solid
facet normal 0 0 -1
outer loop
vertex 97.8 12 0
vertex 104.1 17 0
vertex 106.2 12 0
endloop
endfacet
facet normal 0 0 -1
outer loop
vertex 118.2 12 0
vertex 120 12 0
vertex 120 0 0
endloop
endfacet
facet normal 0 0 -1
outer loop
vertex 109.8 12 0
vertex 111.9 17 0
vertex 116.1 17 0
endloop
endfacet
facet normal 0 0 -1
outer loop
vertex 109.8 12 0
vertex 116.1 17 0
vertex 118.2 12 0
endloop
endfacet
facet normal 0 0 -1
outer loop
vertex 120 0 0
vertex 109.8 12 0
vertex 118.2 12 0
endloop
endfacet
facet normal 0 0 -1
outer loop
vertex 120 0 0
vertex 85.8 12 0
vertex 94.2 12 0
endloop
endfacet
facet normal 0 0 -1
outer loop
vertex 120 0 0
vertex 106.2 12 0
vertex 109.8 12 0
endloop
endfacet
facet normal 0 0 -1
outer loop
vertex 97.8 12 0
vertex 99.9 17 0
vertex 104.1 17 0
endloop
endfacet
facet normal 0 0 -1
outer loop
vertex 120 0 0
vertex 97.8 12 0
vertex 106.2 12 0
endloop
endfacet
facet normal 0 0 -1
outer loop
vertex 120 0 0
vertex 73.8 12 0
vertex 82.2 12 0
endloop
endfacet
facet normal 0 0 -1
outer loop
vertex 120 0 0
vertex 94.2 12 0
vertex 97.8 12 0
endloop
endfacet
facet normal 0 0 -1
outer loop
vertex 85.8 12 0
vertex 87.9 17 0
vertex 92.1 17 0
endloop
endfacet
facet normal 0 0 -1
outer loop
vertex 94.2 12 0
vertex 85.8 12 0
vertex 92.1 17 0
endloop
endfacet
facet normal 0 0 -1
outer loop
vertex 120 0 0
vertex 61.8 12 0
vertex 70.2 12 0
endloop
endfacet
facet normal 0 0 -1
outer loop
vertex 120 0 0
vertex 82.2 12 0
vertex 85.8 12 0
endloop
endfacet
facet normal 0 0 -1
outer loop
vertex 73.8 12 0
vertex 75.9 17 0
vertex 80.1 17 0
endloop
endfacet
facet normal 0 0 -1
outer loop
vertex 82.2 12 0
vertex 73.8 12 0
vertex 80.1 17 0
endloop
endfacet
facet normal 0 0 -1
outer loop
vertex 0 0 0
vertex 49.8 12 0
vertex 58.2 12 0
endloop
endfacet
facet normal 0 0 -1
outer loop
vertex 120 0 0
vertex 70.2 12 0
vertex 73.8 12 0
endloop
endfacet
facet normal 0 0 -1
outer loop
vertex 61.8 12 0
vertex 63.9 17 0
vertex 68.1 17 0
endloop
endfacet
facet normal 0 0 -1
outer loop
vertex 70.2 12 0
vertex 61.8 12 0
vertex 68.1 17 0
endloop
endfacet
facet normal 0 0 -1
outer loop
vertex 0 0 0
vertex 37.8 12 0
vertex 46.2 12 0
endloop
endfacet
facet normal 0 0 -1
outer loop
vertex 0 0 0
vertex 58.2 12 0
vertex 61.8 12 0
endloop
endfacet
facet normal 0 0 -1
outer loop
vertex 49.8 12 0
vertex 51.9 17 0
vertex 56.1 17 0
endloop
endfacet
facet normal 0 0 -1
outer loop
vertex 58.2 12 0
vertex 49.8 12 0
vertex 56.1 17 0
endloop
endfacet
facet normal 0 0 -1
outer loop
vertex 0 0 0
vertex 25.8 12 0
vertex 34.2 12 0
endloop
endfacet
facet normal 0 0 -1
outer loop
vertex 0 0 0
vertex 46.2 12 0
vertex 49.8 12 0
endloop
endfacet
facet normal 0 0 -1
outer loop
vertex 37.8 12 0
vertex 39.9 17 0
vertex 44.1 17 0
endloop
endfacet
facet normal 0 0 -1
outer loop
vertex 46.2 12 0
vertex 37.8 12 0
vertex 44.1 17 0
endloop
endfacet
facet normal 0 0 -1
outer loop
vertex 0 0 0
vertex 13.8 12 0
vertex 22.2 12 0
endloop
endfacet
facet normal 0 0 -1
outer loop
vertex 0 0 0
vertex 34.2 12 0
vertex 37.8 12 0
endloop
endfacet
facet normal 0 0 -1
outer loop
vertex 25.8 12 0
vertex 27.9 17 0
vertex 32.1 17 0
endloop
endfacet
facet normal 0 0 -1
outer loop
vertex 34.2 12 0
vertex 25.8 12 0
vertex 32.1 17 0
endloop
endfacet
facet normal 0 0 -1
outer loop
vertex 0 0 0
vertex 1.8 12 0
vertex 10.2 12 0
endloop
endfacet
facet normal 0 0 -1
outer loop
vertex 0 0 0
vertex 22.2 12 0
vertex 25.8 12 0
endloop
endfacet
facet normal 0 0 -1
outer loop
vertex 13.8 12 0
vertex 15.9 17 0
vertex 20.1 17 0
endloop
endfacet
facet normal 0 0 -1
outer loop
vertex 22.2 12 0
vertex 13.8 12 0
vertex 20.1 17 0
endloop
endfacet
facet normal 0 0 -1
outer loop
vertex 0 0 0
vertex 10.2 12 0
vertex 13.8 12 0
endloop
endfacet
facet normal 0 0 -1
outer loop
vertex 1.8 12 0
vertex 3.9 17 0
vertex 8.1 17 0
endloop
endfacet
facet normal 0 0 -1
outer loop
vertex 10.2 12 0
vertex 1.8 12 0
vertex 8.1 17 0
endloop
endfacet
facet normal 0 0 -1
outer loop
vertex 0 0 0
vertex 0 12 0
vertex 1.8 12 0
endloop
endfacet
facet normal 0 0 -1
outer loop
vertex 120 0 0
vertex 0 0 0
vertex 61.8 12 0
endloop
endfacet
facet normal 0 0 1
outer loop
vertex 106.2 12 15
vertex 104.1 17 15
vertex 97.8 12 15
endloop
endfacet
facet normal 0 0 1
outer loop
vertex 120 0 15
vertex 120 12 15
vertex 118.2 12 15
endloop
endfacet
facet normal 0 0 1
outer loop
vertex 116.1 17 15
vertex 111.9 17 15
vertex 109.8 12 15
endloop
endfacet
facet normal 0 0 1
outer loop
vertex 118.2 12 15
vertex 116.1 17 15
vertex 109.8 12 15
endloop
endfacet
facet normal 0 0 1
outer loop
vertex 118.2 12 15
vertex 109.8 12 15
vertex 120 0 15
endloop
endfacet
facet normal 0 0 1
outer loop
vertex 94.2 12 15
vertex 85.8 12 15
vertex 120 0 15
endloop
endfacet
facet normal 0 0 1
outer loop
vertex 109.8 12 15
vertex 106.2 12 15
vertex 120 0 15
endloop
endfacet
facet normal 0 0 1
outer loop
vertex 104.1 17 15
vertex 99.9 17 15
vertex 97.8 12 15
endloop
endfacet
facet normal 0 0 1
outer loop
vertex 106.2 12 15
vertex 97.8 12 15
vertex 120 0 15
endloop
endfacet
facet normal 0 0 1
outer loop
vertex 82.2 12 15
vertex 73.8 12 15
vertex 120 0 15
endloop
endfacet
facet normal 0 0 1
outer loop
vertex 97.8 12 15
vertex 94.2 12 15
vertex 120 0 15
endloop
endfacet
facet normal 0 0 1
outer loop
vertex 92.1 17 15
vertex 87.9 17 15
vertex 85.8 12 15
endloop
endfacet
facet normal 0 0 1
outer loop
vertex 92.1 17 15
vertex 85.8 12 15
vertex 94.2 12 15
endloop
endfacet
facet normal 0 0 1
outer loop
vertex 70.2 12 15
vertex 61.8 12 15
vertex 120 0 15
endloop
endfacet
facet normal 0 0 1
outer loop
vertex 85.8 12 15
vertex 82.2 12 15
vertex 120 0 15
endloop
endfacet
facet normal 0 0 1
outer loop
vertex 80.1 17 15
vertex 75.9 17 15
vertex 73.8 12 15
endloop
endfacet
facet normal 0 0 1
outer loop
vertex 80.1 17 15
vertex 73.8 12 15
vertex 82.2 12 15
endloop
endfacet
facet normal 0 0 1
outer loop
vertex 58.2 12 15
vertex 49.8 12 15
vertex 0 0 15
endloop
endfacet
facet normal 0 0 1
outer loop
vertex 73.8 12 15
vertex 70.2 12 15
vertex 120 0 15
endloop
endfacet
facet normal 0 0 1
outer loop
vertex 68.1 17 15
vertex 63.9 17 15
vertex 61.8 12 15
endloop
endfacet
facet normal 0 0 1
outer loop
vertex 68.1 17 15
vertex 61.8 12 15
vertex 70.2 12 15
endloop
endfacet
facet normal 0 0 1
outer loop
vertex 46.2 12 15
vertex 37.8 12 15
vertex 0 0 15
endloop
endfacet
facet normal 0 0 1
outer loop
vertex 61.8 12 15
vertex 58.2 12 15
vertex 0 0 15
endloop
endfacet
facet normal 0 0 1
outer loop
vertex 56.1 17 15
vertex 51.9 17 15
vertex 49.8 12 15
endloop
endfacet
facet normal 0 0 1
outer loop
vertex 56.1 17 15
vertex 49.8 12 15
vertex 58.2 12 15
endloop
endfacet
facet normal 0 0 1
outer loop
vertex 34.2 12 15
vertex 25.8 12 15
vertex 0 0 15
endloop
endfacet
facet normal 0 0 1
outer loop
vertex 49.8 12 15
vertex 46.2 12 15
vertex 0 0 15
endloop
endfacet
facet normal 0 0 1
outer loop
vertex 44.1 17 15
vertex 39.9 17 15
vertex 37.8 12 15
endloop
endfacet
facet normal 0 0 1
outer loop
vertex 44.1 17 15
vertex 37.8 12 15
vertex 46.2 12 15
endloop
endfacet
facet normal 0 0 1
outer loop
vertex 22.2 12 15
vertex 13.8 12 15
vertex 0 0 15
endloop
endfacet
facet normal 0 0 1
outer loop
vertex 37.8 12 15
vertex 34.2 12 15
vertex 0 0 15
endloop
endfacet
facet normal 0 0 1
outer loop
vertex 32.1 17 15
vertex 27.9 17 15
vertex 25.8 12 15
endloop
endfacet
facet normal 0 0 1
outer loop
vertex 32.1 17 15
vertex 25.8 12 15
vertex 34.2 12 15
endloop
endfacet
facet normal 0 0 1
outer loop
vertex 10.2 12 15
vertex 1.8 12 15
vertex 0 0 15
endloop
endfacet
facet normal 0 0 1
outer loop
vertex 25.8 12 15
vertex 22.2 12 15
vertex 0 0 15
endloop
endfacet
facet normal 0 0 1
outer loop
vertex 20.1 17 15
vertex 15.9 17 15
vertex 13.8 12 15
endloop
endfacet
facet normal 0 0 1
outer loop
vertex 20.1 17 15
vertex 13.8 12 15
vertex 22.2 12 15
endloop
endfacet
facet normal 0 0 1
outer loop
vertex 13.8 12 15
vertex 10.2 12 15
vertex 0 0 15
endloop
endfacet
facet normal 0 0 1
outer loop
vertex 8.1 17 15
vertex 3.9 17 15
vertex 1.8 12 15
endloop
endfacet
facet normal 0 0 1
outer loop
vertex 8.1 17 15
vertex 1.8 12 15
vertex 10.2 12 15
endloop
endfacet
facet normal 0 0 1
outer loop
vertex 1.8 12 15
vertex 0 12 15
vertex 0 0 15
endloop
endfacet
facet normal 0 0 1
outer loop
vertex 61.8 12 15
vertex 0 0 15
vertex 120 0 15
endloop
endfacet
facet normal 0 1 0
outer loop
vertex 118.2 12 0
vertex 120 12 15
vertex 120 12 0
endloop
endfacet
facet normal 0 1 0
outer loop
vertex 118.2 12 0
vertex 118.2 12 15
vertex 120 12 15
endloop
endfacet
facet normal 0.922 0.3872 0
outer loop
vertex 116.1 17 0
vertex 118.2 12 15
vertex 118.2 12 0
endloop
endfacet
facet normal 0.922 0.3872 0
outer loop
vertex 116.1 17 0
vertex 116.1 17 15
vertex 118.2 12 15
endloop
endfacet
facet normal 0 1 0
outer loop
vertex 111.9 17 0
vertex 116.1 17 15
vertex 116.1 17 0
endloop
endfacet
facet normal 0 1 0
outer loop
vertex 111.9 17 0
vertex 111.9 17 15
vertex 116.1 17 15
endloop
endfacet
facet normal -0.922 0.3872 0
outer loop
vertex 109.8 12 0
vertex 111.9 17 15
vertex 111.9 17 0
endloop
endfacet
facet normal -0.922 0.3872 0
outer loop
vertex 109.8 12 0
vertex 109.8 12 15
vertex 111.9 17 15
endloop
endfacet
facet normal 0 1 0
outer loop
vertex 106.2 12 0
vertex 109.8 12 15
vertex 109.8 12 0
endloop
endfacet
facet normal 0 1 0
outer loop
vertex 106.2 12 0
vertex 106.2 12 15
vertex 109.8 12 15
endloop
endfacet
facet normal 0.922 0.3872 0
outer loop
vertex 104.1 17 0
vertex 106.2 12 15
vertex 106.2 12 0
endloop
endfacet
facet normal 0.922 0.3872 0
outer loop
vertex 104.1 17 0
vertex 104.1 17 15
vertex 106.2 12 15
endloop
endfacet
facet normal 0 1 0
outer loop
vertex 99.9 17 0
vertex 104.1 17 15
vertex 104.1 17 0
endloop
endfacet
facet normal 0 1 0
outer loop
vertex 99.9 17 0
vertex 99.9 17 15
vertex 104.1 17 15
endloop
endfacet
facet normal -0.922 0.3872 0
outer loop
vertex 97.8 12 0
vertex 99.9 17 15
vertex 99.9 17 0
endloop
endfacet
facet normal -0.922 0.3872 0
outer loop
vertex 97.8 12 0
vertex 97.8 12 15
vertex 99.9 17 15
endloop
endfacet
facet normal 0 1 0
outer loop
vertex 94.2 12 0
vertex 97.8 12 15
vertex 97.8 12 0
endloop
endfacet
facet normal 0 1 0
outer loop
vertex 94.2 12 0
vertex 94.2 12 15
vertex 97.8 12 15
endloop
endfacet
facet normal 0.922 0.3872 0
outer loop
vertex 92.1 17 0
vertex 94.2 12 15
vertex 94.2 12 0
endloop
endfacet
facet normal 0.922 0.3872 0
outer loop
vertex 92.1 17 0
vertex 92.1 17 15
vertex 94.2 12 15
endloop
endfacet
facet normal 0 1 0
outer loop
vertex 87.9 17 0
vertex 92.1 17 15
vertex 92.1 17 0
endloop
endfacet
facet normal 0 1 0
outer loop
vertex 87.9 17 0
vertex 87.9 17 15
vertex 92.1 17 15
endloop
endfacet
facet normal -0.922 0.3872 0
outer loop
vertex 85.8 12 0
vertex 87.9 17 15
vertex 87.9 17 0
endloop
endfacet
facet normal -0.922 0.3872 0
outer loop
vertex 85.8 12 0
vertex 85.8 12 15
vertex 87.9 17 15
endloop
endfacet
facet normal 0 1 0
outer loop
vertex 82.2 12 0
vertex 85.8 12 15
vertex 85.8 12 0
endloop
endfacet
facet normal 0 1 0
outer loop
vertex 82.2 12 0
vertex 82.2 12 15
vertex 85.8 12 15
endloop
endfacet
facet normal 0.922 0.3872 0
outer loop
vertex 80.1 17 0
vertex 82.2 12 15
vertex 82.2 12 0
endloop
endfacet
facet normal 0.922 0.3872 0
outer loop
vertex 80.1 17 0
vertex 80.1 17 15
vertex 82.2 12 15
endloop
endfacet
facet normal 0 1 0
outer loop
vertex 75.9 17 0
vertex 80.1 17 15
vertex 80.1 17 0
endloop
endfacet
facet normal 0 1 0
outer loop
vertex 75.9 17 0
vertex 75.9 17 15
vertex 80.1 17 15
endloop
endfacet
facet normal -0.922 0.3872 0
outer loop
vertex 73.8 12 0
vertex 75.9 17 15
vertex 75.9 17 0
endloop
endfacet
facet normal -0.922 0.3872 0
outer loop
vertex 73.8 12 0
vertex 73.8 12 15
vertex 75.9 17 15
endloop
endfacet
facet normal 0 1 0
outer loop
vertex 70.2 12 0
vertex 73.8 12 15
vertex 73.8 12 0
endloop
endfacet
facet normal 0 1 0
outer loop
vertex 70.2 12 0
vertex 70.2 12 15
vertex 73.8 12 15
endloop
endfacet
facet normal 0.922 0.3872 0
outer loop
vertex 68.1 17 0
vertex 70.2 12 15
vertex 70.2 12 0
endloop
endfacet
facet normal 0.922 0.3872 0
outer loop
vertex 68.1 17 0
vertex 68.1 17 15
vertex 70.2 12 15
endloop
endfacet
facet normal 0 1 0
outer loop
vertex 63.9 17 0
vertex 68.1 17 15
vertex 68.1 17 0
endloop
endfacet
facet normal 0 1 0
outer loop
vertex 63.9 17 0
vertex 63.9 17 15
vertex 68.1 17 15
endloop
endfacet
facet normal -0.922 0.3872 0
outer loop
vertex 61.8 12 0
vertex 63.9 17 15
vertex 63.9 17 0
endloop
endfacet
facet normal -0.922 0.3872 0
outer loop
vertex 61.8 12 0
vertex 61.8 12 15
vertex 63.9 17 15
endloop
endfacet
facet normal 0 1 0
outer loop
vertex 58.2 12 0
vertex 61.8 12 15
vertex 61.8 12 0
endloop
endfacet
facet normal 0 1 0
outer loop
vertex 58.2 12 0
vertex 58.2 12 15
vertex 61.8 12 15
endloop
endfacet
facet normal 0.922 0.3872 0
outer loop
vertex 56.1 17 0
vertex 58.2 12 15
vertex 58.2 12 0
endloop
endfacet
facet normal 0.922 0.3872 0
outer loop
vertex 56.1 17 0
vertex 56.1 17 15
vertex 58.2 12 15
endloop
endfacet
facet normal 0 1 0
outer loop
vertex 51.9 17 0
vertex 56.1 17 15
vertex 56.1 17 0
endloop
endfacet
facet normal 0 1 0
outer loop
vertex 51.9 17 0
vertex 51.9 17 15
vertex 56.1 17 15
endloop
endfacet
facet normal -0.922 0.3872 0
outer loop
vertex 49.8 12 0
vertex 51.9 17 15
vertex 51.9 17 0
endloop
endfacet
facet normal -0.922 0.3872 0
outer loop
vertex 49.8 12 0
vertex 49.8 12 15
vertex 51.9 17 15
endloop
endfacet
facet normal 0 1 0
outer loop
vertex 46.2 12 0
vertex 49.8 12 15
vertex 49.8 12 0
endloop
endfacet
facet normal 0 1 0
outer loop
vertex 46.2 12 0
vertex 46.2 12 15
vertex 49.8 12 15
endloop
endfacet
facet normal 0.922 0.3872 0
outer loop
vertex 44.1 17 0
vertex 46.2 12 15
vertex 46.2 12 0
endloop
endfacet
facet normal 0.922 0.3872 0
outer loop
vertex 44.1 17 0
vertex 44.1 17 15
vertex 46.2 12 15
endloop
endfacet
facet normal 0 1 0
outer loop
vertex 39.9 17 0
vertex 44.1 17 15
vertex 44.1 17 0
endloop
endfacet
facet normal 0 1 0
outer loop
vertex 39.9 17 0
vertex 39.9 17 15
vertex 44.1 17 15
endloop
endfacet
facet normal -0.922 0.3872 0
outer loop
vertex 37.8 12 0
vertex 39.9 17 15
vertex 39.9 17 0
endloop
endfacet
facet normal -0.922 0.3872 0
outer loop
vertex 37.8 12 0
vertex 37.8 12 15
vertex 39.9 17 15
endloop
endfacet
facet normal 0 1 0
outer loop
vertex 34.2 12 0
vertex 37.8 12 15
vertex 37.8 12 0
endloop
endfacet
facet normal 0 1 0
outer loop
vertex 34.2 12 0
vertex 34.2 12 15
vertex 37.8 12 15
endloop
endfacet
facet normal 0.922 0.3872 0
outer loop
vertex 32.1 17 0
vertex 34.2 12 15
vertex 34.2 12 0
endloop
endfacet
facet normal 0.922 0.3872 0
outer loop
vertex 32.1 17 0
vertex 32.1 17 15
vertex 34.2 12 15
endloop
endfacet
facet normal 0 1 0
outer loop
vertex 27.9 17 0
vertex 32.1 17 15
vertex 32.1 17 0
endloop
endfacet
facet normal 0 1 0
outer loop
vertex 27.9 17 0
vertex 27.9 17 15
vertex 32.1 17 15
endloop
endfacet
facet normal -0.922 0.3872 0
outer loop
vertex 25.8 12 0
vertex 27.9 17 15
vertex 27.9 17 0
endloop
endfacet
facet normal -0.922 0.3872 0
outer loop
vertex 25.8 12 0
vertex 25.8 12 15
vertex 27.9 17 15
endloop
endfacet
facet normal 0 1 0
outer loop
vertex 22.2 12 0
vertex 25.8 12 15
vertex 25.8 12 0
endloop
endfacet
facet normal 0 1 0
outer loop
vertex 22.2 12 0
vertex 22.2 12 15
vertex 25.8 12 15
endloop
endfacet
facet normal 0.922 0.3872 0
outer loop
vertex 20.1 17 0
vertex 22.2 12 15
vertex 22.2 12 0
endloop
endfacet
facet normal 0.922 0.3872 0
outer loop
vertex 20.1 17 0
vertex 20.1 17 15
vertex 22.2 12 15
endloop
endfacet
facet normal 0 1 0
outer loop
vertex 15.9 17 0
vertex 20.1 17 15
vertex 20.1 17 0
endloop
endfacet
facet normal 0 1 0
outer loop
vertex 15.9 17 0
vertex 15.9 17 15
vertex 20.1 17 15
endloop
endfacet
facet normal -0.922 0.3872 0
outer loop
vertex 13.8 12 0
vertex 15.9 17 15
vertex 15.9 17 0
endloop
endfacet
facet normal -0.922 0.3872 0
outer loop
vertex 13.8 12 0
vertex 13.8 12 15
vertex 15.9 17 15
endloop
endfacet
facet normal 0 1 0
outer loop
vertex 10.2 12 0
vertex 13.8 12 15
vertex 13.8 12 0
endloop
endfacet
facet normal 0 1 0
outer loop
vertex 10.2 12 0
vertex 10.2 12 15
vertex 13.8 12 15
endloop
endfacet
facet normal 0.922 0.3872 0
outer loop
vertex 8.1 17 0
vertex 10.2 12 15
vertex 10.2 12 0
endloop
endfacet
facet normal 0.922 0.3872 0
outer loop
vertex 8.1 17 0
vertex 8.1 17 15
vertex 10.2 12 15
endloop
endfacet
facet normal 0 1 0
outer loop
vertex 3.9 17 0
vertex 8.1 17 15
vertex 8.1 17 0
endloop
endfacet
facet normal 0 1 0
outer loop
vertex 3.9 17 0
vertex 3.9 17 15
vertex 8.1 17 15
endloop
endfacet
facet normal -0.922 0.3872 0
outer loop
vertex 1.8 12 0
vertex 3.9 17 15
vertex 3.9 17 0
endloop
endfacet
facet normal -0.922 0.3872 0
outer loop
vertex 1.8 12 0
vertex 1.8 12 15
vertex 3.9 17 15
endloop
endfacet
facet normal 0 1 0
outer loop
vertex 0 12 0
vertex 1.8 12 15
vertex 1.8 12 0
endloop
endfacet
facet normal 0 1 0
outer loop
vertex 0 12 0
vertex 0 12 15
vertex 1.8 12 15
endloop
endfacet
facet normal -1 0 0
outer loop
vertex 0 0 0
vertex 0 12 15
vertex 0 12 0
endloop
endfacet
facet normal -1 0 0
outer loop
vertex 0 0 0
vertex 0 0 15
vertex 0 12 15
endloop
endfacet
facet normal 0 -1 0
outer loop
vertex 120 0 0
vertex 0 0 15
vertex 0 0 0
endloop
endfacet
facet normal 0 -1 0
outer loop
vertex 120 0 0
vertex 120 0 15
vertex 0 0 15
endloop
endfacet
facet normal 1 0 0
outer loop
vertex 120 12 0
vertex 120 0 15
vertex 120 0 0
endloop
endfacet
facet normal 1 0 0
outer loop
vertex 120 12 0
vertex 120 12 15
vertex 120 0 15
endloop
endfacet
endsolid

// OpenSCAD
$fn = 32;

// ----------------------------------------------------------------------
// Gear rack: 10 teeth, pitch 12 mm
// ----------------------------------------------------------------------

// --- parameters (mm) ---
teeth = 10;               // number of teeth
pitch = 12;               // tooth pitch, X
root_w = 8.4;             // tooth width at the root
tip_w = 4.2;              // tooth width at the tip
base_h = 12;              // rack body height, Y
tooth_h = 5;              // tooth height above the body
plate_t = 15;             // rack width, Z (extrusion height)
fit_tol = 0.05;           // declared fit tolerance (prompt contract)
free_tol = 0.2;           // declared free tolerance (prompt contract)

rack_l = teeth * pitch;  // overall length
total_h = base_h + tooth_h;  // overall height

profile = [[0, 0], [120, 0], [120, 12], [118.2, 12], [116.1, 17], [111.9, 17], [109.8, 12], [106.2, 12], [104.1, 17], [99.9, 17], [97.8, 12], [94.2, 12], [92.1, 17], [87.9, 17], [85.8, 12], [82.2, 12], [80.1, 17], [75.9, 17], [73.8, 12], [70.2, 12], [68.1, 17], [63.9, 17], [61.8, 12], [58.2, 12], [56.1, 17], [51.9, 17], [49.8, 12], [46.2, 12], [44.1, 17], [39.9, 17], [37.8, 12], [34.2, 12], [32.1, 17], [27.9, 17], [25.8, 12], [22.2, 12], [20.1, 17], [15.9, 17], [13.8, 12], [10.2, 12], [8.1, 17], [3.9, 17], [1.8, 12], [0, 12]];  // primary outline, 44 points, counter clockwise

// --- the one profile operation ---
linear_extrude(height = plate_t) polygon(points = profile);
